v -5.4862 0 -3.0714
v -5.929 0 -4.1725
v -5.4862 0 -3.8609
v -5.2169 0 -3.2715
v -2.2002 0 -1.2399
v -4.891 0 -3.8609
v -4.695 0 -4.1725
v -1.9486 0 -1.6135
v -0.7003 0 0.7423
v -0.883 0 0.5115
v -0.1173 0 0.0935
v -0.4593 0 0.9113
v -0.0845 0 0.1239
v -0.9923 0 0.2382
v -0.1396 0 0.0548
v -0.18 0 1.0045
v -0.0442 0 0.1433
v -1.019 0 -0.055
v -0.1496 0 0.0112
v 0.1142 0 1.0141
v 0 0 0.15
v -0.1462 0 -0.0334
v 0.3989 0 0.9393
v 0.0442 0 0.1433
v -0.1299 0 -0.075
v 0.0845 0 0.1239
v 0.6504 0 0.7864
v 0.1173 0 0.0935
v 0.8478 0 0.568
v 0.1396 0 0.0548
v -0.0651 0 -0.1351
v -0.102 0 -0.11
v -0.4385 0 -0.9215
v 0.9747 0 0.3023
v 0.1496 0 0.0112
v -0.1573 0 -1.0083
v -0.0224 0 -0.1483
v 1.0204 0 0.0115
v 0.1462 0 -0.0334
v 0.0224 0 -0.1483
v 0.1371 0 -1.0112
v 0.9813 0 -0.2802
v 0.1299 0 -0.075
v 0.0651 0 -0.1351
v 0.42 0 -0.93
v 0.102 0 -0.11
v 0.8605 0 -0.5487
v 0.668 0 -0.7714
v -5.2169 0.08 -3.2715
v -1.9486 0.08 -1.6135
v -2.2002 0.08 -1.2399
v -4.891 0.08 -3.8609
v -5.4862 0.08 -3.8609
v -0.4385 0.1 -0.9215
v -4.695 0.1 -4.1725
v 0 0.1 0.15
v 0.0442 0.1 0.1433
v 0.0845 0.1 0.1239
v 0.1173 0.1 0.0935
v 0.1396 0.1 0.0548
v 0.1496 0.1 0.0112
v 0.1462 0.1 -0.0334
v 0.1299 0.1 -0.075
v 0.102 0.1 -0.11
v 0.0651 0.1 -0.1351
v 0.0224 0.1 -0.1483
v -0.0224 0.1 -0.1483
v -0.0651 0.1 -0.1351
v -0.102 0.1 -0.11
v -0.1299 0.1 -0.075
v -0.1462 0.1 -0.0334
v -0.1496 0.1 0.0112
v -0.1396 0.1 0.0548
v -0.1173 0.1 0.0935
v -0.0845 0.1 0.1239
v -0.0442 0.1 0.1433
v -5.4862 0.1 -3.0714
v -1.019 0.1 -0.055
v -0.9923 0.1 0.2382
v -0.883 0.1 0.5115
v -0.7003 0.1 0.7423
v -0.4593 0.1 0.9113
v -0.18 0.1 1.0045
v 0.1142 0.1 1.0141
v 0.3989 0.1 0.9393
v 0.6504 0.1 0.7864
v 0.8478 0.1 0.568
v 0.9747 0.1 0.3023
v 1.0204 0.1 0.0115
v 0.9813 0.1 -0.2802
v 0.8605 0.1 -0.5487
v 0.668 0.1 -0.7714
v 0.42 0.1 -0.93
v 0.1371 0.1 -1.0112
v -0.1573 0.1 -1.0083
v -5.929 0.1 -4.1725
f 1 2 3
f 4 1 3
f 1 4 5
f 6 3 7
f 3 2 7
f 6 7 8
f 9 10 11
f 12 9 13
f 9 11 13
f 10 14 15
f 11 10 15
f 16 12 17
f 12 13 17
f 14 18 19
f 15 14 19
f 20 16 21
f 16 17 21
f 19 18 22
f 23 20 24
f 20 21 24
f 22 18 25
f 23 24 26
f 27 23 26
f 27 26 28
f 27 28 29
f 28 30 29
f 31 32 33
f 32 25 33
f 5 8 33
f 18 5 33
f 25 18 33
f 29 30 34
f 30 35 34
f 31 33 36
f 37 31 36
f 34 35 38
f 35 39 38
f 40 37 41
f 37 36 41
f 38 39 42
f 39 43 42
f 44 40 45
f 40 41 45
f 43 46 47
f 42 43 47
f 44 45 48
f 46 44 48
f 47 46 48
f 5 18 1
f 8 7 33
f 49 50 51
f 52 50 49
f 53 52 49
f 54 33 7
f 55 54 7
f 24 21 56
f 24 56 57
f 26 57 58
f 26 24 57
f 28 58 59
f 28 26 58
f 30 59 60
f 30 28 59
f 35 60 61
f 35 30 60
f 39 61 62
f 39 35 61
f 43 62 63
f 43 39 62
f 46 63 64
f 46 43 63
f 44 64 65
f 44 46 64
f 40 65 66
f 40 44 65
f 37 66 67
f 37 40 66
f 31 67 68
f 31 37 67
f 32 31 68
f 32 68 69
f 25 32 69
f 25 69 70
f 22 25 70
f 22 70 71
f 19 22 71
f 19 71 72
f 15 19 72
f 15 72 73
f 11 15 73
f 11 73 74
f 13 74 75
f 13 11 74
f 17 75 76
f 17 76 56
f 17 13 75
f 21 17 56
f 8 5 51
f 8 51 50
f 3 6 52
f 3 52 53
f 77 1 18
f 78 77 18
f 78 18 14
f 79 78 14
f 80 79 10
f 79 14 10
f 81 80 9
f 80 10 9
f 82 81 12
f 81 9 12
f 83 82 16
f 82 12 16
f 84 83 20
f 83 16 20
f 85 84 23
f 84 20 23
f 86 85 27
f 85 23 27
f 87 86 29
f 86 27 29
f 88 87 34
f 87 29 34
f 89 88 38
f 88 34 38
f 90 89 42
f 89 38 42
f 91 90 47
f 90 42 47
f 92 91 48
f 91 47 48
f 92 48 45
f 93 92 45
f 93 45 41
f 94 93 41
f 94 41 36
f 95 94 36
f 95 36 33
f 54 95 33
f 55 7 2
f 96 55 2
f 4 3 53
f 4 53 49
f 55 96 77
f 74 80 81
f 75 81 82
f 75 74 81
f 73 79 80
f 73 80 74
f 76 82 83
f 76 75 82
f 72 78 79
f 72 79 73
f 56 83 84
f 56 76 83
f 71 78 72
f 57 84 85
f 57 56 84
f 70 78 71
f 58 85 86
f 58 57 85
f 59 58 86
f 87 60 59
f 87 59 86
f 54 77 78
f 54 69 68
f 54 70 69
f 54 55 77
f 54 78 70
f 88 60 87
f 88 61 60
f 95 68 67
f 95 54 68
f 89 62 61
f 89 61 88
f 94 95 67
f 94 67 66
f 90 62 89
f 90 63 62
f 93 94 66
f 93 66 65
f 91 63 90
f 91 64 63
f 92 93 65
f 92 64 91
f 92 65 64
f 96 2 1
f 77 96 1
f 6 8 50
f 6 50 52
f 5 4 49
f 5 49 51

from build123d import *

# Parameters (mm, degrees)
SKETCH1_R           = 0.15
BOSS_EXTRUDE1_DEPTH = 0.1
BOSS_EXTRUDE3_DEPTH = 0.02


with BuildPart() as part:
    # Sketch1 → Boss-Extrude1 (new body)
    with BuildSketch(Plane(origin=(0, 0, 0), x_dir=(1, 0, 0), z_dir=(0, 1, 0))):
        with BuildLine():
            Line((-5.928976917, 4.17249718), (-5.486197441, 3.071413653))
            Line((-5.486197441, 3.071413653), (-1.019009626, 0.054984583))
            ThreePointArc((-1.019009626, 0.054984583), (0.847824795, -0.567976267), (-0.438539423, 0.921459222))
            Line((-0.438539423, 0.921459222), (-4.694959938, 4.17249718))
            Line((-4.694959938, 4.17249718), (-5.928976917, 4.17249718))
        make_face()
        with Locations(Location((0, 0, 0), (0, 0, 270))):
            Circle(SKETCH1_R, mode=Mode.SUBTRACT)
        Polygon((-5.486197441, 3.860892642), (-5.216856249, 3.271495682), (-2.200234898, 1.239893548), (-1.948613115, 1.613513771), (-4.890993257, 3.860892642), align=None, mode=Mode.SUBTRACT)
    extrude(amount=BOSS_EXTRUDE1_DEPTH)

    # Sketch3 → Boss-Extrude3 (add)
    with BuildSketch(Plane(origin=(0, 0.1, 0), x_dir=(1, 0, 0), z_dir=(0, 1, 0))):
        Polygon((-5.669795802, 4.060835761), (-4.60725372, 3.952218978), (-1.551568417, 1.529417339), (-2.04496188, 0.980620035), (-5.388394983, 3.169960387), align=None)
    extrude(amount=-BOSS_EXTRUDE3_DEPTH)


solid = part.part
